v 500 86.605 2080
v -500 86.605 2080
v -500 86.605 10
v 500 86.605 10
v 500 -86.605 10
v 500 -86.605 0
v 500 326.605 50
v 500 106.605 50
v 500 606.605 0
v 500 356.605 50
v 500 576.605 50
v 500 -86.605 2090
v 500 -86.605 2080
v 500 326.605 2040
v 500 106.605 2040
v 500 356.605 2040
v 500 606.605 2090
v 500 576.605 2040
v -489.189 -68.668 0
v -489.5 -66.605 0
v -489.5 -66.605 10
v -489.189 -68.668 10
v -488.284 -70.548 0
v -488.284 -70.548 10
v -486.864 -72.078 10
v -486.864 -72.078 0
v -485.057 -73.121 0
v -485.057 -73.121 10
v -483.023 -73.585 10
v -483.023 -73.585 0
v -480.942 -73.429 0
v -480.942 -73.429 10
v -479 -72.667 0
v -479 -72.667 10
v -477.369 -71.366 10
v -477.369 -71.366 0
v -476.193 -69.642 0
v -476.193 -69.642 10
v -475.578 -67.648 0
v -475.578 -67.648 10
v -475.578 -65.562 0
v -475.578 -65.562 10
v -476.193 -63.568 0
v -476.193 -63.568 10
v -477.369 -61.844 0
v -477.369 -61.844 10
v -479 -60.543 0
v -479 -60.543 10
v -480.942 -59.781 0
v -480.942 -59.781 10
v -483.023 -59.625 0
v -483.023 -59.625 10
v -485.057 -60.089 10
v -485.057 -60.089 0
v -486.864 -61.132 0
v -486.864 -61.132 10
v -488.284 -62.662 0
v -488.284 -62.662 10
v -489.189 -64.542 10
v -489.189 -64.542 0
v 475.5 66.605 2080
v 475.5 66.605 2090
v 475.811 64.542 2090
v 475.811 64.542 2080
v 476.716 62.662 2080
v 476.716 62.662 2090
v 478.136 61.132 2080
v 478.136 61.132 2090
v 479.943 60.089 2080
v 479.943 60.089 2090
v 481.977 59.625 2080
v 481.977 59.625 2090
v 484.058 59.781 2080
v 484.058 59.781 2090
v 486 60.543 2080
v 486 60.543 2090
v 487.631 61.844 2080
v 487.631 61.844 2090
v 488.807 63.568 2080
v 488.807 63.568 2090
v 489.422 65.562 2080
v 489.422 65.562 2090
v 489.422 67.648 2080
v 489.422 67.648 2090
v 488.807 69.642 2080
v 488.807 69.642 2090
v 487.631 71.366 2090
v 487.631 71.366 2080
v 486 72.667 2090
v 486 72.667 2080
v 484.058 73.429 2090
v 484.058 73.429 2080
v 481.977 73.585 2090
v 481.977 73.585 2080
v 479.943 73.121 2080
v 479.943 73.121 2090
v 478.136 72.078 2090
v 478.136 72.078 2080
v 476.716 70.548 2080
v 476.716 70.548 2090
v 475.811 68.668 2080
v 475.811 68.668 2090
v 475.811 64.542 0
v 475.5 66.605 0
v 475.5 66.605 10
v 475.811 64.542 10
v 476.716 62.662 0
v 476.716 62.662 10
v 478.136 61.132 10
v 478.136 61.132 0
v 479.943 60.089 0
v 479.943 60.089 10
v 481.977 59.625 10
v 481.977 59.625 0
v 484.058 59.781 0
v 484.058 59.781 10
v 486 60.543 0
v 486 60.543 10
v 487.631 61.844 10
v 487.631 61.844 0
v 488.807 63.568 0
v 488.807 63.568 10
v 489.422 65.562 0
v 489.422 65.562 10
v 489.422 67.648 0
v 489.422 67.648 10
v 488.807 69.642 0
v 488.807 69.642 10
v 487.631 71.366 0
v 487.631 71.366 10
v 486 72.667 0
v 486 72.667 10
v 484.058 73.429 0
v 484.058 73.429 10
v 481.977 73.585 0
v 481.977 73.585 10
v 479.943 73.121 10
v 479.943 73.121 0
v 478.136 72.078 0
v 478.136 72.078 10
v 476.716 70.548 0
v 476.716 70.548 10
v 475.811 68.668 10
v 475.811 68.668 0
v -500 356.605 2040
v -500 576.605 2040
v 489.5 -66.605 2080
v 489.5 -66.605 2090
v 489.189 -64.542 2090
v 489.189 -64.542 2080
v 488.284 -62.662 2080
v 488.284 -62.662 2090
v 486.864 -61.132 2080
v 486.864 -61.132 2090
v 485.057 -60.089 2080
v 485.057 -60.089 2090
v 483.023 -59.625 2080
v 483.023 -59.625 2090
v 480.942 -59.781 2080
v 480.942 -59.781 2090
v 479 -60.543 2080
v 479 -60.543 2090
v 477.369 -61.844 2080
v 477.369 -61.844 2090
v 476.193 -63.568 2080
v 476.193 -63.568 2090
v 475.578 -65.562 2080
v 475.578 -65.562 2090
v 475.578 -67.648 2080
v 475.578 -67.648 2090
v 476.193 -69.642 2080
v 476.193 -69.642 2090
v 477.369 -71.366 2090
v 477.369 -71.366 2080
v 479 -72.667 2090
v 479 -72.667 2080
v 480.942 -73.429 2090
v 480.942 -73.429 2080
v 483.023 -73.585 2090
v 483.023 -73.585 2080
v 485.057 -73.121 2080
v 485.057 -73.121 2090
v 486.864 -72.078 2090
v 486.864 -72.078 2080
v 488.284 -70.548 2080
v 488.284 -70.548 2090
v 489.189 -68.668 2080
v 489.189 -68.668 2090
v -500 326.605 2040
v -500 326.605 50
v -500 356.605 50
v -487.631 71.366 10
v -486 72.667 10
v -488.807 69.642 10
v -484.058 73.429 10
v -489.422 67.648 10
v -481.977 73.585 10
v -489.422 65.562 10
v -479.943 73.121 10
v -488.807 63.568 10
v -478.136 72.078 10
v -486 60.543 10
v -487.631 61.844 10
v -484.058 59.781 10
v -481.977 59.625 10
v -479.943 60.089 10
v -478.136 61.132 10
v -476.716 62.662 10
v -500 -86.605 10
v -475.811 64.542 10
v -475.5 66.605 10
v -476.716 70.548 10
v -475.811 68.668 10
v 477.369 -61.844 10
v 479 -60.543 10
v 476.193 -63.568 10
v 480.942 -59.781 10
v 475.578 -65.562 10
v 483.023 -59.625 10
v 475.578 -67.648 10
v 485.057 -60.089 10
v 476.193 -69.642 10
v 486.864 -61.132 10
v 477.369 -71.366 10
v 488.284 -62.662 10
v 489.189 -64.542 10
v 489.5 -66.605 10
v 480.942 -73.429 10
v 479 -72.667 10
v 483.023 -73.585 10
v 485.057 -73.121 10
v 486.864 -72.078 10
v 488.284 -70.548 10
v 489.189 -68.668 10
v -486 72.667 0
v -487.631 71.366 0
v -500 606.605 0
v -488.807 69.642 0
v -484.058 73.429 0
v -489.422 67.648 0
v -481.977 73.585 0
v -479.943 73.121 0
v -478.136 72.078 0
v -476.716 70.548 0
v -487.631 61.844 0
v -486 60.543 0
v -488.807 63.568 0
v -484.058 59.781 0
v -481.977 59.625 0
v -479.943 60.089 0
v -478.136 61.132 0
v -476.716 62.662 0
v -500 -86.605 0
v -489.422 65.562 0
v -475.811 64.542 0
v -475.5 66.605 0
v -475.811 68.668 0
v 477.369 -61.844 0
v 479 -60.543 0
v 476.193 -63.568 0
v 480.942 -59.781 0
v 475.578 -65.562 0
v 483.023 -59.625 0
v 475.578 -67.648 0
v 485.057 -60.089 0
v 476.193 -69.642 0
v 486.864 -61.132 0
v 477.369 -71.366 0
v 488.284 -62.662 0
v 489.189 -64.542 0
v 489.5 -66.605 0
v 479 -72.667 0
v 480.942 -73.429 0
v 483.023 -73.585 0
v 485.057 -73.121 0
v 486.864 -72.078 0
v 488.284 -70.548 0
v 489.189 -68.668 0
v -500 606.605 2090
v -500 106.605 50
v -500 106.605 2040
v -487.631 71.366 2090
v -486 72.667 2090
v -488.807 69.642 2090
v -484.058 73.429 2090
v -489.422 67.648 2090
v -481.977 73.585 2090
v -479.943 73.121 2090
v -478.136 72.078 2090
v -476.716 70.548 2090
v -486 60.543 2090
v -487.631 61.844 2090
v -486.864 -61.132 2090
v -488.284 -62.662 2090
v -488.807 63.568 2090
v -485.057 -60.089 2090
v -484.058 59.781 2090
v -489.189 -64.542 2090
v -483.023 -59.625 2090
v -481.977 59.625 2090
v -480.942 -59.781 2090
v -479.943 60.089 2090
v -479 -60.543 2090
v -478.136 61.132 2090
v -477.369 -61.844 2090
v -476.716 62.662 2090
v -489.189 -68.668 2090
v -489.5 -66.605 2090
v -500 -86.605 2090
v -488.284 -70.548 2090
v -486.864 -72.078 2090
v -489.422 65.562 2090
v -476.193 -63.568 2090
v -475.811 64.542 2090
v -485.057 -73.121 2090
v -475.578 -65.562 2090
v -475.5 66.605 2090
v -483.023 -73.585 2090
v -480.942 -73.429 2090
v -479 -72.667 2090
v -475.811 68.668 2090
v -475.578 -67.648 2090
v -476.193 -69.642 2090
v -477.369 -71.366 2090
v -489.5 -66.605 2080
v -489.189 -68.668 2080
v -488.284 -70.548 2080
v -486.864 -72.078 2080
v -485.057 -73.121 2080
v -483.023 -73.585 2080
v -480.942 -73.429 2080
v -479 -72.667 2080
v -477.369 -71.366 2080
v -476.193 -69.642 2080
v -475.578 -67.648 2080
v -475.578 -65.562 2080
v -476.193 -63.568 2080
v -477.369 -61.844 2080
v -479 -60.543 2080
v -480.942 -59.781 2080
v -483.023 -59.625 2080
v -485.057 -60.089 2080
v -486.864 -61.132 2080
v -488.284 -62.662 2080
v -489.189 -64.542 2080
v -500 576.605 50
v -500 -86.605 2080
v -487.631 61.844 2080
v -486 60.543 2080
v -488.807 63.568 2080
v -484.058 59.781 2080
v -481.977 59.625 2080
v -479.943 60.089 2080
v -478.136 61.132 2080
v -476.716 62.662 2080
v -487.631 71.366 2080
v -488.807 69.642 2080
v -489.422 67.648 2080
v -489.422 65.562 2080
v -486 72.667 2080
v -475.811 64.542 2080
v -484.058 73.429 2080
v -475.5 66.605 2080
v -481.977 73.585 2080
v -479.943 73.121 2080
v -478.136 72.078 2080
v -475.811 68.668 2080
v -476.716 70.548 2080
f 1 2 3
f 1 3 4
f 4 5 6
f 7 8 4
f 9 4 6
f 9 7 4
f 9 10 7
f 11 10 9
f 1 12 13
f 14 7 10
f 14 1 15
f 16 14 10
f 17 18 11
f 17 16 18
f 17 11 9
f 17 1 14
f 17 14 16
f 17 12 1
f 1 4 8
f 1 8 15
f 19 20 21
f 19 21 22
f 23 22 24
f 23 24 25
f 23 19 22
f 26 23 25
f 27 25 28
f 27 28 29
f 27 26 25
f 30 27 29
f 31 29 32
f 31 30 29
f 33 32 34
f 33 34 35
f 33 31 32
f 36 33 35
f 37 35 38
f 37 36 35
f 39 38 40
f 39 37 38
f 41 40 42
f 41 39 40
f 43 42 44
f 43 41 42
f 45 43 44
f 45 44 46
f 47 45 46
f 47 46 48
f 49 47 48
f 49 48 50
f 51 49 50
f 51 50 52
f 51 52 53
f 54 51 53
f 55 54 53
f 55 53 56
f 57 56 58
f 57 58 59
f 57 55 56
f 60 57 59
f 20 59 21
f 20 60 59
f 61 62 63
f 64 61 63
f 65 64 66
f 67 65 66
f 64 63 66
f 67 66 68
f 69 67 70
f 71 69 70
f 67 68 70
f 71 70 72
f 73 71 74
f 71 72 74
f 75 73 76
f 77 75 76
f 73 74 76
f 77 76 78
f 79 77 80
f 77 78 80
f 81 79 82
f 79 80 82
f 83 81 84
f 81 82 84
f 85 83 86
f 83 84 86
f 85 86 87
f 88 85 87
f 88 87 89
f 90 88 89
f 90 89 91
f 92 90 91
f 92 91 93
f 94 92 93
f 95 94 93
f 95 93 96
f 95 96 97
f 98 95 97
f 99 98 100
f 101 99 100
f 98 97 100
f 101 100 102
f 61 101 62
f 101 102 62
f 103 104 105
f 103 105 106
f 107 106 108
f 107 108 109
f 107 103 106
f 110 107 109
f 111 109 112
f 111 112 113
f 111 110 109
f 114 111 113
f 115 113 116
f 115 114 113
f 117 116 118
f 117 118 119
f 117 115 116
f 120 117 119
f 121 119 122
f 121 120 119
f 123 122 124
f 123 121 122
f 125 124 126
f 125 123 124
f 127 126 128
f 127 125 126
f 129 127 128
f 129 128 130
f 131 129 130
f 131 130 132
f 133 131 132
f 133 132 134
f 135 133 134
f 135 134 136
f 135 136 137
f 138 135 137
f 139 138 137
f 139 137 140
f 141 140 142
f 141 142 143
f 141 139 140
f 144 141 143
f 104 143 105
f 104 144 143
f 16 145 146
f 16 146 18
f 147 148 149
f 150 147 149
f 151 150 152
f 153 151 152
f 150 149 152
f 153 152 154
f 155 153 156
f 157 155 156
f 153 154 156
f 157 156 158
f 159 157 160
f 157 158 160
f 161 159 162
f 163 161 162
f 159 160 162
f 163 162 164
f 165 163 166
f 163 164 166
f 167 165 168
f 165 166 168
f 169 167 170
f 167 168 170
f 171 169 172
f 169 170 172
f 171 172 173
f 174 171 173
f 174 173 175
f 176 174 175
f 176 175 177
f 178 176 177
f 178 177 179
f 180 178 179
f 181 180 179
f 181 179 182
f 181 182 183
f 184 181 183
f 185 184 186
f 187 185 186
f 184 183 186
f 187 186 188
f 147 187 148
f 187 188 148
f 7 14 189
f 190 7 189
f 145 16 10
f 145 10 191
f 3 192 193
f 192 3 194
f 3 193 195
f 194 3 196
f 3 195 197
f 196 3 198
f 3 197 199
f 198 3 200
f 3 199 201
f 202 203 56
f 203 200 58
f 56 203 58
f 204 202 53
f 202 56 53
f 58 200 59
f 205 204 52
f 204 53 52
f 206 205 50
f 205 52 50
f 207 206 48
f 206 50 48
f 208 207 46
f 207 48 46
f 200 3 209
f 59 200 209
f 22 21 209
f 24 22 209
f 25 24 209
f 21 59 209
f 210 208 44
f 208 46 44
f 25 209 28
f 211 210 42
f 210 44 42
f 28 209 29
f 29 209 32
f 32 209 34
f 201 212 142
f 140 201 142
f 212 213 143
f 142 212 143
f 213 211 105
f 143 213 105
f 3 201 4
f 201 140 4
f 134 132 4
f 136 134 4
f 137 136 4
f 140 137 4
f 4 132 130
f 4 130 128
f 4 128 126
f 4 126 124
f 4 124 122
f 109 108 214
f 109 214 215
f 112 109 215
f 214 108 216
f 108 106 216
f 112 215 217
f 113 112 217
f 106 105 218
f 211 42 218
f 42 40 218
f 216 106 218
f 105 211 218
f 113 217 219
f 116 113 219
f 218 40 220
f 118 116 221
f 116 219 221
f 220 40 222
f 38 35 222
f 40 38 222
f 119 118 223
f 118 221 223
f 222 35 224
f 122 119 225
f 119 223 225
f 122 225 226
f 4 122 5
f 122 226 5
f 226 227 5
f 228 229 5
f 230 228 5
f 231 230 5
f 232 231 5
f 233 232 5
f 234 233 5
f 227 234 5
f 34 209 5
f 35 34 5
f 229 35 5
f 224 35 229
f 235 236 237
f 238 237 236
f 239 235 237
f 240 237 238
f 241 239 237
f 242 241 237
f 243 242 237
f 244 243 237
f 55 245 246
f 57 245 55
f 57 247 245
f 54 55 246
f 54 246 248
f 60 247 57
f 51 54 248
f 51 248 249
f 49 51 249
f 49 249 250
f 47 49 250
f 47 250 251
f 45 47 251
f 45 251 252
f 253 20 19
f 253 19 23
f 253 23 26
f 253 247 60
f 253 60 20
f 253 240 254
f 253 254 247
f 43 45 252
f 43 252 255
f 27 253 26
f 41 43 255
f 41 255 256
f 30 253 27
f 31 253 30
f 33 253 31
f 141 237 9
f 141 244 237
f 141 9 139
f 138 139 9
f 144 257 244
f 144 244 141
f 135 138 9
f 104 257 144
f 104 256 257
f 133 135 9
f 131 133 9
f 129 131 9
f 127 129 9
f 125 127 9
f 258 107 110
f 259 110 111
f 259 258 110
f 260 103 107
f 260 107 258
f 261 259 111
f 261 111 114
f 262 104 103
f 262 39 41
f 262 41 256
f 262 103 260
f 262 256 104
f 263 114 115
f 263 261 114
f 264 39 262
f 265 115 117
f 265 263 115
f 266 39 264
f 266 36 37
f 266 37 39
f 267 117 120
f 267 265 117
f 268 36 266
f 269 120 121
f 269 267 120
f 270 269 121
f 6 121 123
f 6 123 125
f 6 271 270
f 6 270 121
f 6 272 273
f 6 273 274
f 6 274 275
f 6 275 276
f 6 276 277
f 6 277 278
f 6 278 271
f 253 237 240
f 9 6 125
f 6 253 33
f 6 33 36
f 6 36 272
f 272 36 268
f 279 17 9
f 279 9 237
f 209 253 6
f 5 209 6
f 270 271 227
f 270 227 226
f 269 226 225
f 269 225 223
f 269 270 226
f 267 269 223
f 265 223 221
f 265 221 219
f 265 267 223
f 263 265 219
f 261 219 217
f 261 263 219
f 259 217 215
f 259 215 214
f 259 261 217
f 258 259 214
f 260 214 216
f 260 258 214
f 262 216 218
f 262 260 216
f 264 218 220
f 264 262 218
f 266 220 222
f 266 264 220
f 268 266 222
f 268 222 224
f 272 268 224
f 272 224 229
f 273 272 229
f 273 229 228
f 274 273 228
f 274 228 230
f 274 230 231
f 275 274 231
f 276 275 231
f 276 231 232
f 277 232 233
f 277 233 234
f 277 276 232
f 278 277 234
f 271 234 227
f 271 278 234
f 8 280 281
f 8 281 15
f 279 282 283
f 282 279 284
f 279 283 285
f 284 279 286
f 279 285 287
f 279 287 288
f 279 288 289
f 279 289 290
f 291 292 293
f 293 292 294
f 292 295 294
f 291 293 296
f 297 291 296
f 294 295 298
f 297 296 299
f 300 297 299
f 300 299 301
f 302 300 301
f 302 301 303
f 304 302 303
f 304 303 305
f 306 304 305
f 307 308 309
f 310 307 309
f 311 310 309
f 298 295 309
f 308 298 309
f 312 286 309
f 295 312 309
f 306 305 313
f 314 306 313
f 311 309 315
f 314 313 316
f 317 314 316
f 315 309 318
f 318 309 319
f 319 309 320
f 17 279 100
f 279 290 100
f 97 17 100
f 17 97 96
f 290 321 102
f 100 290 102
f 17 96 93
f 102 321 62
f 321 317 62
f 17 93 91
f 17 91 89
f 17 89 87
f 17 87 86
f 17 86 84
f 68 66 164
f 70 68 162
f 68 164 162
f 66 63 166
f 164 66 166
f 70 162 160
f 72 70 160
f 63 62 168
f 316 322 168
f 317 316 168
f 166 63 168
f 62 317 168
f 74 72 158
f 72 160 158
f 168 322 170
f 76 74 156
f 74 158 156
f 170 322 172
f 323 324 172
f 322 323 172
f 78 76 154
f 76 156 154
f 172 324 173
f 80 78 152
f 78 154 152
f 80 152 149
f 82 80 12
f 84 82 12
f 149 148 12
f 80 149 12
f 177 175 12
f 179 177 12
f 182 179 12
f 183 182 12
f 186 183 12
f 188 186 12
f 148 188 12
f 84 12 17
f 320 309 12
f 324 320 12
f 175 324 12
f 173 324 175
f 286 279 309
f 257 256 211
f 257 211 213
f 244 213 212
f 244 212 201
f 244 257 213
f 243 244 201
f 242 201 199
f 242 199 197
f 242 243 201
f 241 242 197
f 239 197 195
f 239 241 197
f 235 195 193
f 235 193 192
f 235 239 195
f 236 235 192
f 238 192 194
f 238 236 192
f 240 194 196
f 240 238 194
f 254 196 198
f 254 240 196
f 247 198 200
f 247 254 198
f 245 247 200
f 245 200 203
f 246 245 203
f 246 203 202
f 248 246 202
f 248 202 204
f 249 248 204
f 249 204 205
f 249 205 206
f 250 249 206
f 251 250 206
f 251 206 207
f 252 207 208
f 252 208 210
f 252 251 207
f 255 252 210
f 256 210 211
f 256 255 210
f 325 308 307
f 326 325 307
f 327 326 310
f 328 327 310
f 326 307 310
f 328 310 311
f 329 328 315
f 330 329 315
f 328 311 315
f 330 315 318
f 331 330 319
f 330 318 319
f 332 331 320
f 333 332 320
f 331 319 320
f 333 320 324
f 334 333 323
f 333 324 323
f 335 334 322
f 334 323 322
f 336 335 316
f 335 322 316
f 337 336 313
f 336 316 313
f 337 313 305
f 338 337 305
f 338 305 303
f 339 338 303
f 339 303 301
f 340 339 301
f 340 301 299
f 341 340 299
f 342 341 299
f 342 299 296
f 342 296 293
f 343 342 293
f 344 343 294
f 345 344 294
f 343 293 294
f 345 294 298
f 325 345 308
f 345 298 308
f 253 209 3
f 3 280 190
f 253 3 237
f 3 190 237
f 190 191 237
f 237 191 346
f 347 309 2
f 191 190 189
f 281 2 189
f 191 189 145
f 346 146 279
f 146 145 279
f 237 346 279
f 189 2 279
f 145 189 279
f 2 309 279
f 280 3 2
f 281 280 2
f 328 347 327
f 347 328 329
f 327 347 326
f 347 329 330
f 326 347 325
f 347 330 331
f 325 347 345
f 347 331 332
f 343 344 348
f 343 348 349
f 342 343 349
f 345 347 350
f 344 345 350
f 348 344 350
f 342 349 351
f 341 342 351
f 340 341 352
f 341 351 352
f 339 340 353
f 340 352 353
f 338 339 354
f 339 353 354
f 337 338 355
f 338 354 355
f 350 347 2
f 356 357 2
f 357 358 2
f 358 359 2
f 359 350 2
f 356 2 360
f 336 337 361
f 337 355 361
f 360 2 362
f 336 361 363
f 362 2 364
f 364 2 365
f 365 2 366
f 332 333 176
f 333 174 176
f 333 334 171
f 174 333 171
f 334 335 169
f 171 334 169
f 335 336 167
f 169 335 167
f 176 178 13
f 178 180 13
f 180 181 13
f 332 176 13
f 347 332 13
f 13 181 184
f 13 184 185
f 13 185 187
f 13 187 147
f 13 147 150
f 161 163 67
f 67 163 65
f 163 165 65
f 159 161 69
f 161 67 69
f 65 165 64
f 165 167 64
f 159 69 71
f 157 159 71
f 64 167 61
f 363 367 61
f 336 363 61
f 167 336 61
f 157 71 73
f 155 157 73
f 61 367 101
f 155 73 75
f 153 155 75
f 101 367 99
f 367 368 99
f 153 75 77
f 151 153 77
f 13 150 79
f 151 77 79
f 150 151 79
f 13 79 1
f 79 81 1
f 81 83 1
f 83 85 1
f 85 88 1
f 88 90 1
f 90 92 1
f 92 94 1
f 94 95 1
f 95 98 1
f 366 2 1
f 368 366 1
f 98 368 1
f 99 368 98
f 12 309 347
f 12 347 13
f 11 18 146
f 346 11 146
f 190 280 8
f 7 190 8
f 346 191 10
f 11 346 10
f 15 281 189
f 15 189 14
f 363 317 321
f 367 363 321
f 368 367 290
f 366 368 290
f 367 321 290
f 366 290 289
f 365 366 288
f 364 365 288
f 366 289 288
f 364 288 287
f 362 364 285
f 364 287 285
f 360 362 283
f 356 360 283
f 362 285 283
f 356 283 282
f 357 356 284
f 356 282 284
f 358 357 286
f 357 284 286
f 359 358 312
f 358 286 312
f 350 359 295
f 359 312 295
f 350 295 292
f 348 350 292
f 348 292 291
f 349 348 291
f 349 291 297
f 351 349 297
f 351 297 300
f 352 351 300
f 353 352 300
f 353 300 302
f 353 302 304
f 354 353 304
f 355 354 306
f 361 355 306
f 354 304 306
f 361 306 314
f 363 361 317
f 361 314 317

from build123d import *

# Parameters (mm, degrees)
SZKIC1_W                    = 1000
SZKIC1_H                    = 173.21
SZKIC1_R                    = 7
DODANIE_WYCI_GNI_CIE1_DEPTH = 10
SZKIC3_W                    = 1000
SZKIC3_H                    = 10
DODANIE_WYCI_GNI_CIE3_DEPTH = 20
SZKIC4_W                    = 1000
SZKIC4_H                    = 20
DODANIE_WYCI_GNI_CIE4_DEPTH = 2080
SZKIC5_W                    = 1000
SZKIC5_H                    = 50
DODANIE_WYCI_GNI_CIE5_DEPTH = 500
SZKIC6_W                    = 1000
SZKIC6_H                    = 30
DODANIE_WYCI_GNI_CIE6_DEPTH = 1990
SZYK_LINIOWY1_COUNT         = 2
SZYK_LINIOWY1_PITCH         = 250


with BuildPart() as part:
    # Szkic1 → Dodanie-wyciągnięcie1 (new body)
    with BuildSketch(Plane.XY):
        Rectangle(SZKIC1_W, SZKIC1_H)
        with Locations((-482.5, 66.605)):
            Circle(SZKIC1_R, mode=Mode.SUBTRACT)
        with Locations(Location((482.5, 66.605, 0), (0, 0, 180))):
            Circle(SZKIC1_R, mode=Mode.SUBTRACT)
        with Locations(Location((-482.5, -66.605, 0), (0, 0, 180))):
            Circle(SZKIC1_R, mode=Mode.SUBTRACT)
        with Locations((482.5, -66.605)):
            Circle(SZKIC1_R, mode=Mode.SUBTRACT)
    dodanie_wyci_gni_cie1 = extrude(amount=DODANIE_WYCI_GNI_CIE1_DEPTH)

    # Szkic3 → Dodanie-wyciągnięcie3 (add)
    with BuildSketch(Plane(origin=(0, 86.605, 0), x_dir=(1, 0, 0), z_dir=(0, 1, 0))):
        with Locations((0, -5)):
            Rectangle(SZKIC3_W, SZKIC3_H)
    extrude(amount=DODANIE_WYCI_GNI_CIE3_DEPTH)

    # Szkic4 → Dodanie-wyciągnięcie4 (add)
    with BuildSketch(Plane.XY.offset(10)):
        with Locations((0, 96.605)):
            Rectangle(SZKIC4_W, SZKIC4_H)
    extrude(amount=DODANIE_WYCI_GNI_CIE4_DEPTH)

    # Lustro1: Dodanie-wyciągnięcie1 across plane
    add(dodanie_wyci_gni_cie1.mirror(Plane(origin=(0, 0, 1045), x_dir=(1, 0, 0), z_dir=(0, 0, -1))))

    # Szkic5 → Dodanie-wyciągnięcie5 (add)
    with BuildSketch(Plane(origin=(0, 106.605, 0), x_dir=(1, 0, 0), z_dir=(0, 1, 0))):
        with Locations((0, -2065)):
            Rectangle(SZKIC5_W, SZKIC5_H)
        with Locations((0, -25)):
            Rectangle(SZKIC5_W, SZKIC5_H)
    extrude(amount=DODANIE_WYCI_GNI_CIE5_DEPTH)

    # Szkic6 → Dodanie-wyciągnięcie6 (add)
    with BuildSketch(Plane(origin=(0, 0, 2040), x_dir=(-1, 0, 0), z_dir=(0, 0, -1))):
        with Locations((0, 341.605)):
            Rectangle(SZKIC6_W, SZKIC6_H)
    dodanie_wyci_gni_cie6 = extrude(amount=DODANIE_WYCI_GNI_CIE6_DEPTH)

    # Szyk liniowy1: Dodanie-wyciągnięcie6 ×2
    with Locations(*[(0, i * SZYK_LINIOWY1_PITCH, 0) for i in range(1, SZYK_LINIOWY1_COUNT)]):
        add(dodanie_wyci_gni_cie6)


solid = part.part
